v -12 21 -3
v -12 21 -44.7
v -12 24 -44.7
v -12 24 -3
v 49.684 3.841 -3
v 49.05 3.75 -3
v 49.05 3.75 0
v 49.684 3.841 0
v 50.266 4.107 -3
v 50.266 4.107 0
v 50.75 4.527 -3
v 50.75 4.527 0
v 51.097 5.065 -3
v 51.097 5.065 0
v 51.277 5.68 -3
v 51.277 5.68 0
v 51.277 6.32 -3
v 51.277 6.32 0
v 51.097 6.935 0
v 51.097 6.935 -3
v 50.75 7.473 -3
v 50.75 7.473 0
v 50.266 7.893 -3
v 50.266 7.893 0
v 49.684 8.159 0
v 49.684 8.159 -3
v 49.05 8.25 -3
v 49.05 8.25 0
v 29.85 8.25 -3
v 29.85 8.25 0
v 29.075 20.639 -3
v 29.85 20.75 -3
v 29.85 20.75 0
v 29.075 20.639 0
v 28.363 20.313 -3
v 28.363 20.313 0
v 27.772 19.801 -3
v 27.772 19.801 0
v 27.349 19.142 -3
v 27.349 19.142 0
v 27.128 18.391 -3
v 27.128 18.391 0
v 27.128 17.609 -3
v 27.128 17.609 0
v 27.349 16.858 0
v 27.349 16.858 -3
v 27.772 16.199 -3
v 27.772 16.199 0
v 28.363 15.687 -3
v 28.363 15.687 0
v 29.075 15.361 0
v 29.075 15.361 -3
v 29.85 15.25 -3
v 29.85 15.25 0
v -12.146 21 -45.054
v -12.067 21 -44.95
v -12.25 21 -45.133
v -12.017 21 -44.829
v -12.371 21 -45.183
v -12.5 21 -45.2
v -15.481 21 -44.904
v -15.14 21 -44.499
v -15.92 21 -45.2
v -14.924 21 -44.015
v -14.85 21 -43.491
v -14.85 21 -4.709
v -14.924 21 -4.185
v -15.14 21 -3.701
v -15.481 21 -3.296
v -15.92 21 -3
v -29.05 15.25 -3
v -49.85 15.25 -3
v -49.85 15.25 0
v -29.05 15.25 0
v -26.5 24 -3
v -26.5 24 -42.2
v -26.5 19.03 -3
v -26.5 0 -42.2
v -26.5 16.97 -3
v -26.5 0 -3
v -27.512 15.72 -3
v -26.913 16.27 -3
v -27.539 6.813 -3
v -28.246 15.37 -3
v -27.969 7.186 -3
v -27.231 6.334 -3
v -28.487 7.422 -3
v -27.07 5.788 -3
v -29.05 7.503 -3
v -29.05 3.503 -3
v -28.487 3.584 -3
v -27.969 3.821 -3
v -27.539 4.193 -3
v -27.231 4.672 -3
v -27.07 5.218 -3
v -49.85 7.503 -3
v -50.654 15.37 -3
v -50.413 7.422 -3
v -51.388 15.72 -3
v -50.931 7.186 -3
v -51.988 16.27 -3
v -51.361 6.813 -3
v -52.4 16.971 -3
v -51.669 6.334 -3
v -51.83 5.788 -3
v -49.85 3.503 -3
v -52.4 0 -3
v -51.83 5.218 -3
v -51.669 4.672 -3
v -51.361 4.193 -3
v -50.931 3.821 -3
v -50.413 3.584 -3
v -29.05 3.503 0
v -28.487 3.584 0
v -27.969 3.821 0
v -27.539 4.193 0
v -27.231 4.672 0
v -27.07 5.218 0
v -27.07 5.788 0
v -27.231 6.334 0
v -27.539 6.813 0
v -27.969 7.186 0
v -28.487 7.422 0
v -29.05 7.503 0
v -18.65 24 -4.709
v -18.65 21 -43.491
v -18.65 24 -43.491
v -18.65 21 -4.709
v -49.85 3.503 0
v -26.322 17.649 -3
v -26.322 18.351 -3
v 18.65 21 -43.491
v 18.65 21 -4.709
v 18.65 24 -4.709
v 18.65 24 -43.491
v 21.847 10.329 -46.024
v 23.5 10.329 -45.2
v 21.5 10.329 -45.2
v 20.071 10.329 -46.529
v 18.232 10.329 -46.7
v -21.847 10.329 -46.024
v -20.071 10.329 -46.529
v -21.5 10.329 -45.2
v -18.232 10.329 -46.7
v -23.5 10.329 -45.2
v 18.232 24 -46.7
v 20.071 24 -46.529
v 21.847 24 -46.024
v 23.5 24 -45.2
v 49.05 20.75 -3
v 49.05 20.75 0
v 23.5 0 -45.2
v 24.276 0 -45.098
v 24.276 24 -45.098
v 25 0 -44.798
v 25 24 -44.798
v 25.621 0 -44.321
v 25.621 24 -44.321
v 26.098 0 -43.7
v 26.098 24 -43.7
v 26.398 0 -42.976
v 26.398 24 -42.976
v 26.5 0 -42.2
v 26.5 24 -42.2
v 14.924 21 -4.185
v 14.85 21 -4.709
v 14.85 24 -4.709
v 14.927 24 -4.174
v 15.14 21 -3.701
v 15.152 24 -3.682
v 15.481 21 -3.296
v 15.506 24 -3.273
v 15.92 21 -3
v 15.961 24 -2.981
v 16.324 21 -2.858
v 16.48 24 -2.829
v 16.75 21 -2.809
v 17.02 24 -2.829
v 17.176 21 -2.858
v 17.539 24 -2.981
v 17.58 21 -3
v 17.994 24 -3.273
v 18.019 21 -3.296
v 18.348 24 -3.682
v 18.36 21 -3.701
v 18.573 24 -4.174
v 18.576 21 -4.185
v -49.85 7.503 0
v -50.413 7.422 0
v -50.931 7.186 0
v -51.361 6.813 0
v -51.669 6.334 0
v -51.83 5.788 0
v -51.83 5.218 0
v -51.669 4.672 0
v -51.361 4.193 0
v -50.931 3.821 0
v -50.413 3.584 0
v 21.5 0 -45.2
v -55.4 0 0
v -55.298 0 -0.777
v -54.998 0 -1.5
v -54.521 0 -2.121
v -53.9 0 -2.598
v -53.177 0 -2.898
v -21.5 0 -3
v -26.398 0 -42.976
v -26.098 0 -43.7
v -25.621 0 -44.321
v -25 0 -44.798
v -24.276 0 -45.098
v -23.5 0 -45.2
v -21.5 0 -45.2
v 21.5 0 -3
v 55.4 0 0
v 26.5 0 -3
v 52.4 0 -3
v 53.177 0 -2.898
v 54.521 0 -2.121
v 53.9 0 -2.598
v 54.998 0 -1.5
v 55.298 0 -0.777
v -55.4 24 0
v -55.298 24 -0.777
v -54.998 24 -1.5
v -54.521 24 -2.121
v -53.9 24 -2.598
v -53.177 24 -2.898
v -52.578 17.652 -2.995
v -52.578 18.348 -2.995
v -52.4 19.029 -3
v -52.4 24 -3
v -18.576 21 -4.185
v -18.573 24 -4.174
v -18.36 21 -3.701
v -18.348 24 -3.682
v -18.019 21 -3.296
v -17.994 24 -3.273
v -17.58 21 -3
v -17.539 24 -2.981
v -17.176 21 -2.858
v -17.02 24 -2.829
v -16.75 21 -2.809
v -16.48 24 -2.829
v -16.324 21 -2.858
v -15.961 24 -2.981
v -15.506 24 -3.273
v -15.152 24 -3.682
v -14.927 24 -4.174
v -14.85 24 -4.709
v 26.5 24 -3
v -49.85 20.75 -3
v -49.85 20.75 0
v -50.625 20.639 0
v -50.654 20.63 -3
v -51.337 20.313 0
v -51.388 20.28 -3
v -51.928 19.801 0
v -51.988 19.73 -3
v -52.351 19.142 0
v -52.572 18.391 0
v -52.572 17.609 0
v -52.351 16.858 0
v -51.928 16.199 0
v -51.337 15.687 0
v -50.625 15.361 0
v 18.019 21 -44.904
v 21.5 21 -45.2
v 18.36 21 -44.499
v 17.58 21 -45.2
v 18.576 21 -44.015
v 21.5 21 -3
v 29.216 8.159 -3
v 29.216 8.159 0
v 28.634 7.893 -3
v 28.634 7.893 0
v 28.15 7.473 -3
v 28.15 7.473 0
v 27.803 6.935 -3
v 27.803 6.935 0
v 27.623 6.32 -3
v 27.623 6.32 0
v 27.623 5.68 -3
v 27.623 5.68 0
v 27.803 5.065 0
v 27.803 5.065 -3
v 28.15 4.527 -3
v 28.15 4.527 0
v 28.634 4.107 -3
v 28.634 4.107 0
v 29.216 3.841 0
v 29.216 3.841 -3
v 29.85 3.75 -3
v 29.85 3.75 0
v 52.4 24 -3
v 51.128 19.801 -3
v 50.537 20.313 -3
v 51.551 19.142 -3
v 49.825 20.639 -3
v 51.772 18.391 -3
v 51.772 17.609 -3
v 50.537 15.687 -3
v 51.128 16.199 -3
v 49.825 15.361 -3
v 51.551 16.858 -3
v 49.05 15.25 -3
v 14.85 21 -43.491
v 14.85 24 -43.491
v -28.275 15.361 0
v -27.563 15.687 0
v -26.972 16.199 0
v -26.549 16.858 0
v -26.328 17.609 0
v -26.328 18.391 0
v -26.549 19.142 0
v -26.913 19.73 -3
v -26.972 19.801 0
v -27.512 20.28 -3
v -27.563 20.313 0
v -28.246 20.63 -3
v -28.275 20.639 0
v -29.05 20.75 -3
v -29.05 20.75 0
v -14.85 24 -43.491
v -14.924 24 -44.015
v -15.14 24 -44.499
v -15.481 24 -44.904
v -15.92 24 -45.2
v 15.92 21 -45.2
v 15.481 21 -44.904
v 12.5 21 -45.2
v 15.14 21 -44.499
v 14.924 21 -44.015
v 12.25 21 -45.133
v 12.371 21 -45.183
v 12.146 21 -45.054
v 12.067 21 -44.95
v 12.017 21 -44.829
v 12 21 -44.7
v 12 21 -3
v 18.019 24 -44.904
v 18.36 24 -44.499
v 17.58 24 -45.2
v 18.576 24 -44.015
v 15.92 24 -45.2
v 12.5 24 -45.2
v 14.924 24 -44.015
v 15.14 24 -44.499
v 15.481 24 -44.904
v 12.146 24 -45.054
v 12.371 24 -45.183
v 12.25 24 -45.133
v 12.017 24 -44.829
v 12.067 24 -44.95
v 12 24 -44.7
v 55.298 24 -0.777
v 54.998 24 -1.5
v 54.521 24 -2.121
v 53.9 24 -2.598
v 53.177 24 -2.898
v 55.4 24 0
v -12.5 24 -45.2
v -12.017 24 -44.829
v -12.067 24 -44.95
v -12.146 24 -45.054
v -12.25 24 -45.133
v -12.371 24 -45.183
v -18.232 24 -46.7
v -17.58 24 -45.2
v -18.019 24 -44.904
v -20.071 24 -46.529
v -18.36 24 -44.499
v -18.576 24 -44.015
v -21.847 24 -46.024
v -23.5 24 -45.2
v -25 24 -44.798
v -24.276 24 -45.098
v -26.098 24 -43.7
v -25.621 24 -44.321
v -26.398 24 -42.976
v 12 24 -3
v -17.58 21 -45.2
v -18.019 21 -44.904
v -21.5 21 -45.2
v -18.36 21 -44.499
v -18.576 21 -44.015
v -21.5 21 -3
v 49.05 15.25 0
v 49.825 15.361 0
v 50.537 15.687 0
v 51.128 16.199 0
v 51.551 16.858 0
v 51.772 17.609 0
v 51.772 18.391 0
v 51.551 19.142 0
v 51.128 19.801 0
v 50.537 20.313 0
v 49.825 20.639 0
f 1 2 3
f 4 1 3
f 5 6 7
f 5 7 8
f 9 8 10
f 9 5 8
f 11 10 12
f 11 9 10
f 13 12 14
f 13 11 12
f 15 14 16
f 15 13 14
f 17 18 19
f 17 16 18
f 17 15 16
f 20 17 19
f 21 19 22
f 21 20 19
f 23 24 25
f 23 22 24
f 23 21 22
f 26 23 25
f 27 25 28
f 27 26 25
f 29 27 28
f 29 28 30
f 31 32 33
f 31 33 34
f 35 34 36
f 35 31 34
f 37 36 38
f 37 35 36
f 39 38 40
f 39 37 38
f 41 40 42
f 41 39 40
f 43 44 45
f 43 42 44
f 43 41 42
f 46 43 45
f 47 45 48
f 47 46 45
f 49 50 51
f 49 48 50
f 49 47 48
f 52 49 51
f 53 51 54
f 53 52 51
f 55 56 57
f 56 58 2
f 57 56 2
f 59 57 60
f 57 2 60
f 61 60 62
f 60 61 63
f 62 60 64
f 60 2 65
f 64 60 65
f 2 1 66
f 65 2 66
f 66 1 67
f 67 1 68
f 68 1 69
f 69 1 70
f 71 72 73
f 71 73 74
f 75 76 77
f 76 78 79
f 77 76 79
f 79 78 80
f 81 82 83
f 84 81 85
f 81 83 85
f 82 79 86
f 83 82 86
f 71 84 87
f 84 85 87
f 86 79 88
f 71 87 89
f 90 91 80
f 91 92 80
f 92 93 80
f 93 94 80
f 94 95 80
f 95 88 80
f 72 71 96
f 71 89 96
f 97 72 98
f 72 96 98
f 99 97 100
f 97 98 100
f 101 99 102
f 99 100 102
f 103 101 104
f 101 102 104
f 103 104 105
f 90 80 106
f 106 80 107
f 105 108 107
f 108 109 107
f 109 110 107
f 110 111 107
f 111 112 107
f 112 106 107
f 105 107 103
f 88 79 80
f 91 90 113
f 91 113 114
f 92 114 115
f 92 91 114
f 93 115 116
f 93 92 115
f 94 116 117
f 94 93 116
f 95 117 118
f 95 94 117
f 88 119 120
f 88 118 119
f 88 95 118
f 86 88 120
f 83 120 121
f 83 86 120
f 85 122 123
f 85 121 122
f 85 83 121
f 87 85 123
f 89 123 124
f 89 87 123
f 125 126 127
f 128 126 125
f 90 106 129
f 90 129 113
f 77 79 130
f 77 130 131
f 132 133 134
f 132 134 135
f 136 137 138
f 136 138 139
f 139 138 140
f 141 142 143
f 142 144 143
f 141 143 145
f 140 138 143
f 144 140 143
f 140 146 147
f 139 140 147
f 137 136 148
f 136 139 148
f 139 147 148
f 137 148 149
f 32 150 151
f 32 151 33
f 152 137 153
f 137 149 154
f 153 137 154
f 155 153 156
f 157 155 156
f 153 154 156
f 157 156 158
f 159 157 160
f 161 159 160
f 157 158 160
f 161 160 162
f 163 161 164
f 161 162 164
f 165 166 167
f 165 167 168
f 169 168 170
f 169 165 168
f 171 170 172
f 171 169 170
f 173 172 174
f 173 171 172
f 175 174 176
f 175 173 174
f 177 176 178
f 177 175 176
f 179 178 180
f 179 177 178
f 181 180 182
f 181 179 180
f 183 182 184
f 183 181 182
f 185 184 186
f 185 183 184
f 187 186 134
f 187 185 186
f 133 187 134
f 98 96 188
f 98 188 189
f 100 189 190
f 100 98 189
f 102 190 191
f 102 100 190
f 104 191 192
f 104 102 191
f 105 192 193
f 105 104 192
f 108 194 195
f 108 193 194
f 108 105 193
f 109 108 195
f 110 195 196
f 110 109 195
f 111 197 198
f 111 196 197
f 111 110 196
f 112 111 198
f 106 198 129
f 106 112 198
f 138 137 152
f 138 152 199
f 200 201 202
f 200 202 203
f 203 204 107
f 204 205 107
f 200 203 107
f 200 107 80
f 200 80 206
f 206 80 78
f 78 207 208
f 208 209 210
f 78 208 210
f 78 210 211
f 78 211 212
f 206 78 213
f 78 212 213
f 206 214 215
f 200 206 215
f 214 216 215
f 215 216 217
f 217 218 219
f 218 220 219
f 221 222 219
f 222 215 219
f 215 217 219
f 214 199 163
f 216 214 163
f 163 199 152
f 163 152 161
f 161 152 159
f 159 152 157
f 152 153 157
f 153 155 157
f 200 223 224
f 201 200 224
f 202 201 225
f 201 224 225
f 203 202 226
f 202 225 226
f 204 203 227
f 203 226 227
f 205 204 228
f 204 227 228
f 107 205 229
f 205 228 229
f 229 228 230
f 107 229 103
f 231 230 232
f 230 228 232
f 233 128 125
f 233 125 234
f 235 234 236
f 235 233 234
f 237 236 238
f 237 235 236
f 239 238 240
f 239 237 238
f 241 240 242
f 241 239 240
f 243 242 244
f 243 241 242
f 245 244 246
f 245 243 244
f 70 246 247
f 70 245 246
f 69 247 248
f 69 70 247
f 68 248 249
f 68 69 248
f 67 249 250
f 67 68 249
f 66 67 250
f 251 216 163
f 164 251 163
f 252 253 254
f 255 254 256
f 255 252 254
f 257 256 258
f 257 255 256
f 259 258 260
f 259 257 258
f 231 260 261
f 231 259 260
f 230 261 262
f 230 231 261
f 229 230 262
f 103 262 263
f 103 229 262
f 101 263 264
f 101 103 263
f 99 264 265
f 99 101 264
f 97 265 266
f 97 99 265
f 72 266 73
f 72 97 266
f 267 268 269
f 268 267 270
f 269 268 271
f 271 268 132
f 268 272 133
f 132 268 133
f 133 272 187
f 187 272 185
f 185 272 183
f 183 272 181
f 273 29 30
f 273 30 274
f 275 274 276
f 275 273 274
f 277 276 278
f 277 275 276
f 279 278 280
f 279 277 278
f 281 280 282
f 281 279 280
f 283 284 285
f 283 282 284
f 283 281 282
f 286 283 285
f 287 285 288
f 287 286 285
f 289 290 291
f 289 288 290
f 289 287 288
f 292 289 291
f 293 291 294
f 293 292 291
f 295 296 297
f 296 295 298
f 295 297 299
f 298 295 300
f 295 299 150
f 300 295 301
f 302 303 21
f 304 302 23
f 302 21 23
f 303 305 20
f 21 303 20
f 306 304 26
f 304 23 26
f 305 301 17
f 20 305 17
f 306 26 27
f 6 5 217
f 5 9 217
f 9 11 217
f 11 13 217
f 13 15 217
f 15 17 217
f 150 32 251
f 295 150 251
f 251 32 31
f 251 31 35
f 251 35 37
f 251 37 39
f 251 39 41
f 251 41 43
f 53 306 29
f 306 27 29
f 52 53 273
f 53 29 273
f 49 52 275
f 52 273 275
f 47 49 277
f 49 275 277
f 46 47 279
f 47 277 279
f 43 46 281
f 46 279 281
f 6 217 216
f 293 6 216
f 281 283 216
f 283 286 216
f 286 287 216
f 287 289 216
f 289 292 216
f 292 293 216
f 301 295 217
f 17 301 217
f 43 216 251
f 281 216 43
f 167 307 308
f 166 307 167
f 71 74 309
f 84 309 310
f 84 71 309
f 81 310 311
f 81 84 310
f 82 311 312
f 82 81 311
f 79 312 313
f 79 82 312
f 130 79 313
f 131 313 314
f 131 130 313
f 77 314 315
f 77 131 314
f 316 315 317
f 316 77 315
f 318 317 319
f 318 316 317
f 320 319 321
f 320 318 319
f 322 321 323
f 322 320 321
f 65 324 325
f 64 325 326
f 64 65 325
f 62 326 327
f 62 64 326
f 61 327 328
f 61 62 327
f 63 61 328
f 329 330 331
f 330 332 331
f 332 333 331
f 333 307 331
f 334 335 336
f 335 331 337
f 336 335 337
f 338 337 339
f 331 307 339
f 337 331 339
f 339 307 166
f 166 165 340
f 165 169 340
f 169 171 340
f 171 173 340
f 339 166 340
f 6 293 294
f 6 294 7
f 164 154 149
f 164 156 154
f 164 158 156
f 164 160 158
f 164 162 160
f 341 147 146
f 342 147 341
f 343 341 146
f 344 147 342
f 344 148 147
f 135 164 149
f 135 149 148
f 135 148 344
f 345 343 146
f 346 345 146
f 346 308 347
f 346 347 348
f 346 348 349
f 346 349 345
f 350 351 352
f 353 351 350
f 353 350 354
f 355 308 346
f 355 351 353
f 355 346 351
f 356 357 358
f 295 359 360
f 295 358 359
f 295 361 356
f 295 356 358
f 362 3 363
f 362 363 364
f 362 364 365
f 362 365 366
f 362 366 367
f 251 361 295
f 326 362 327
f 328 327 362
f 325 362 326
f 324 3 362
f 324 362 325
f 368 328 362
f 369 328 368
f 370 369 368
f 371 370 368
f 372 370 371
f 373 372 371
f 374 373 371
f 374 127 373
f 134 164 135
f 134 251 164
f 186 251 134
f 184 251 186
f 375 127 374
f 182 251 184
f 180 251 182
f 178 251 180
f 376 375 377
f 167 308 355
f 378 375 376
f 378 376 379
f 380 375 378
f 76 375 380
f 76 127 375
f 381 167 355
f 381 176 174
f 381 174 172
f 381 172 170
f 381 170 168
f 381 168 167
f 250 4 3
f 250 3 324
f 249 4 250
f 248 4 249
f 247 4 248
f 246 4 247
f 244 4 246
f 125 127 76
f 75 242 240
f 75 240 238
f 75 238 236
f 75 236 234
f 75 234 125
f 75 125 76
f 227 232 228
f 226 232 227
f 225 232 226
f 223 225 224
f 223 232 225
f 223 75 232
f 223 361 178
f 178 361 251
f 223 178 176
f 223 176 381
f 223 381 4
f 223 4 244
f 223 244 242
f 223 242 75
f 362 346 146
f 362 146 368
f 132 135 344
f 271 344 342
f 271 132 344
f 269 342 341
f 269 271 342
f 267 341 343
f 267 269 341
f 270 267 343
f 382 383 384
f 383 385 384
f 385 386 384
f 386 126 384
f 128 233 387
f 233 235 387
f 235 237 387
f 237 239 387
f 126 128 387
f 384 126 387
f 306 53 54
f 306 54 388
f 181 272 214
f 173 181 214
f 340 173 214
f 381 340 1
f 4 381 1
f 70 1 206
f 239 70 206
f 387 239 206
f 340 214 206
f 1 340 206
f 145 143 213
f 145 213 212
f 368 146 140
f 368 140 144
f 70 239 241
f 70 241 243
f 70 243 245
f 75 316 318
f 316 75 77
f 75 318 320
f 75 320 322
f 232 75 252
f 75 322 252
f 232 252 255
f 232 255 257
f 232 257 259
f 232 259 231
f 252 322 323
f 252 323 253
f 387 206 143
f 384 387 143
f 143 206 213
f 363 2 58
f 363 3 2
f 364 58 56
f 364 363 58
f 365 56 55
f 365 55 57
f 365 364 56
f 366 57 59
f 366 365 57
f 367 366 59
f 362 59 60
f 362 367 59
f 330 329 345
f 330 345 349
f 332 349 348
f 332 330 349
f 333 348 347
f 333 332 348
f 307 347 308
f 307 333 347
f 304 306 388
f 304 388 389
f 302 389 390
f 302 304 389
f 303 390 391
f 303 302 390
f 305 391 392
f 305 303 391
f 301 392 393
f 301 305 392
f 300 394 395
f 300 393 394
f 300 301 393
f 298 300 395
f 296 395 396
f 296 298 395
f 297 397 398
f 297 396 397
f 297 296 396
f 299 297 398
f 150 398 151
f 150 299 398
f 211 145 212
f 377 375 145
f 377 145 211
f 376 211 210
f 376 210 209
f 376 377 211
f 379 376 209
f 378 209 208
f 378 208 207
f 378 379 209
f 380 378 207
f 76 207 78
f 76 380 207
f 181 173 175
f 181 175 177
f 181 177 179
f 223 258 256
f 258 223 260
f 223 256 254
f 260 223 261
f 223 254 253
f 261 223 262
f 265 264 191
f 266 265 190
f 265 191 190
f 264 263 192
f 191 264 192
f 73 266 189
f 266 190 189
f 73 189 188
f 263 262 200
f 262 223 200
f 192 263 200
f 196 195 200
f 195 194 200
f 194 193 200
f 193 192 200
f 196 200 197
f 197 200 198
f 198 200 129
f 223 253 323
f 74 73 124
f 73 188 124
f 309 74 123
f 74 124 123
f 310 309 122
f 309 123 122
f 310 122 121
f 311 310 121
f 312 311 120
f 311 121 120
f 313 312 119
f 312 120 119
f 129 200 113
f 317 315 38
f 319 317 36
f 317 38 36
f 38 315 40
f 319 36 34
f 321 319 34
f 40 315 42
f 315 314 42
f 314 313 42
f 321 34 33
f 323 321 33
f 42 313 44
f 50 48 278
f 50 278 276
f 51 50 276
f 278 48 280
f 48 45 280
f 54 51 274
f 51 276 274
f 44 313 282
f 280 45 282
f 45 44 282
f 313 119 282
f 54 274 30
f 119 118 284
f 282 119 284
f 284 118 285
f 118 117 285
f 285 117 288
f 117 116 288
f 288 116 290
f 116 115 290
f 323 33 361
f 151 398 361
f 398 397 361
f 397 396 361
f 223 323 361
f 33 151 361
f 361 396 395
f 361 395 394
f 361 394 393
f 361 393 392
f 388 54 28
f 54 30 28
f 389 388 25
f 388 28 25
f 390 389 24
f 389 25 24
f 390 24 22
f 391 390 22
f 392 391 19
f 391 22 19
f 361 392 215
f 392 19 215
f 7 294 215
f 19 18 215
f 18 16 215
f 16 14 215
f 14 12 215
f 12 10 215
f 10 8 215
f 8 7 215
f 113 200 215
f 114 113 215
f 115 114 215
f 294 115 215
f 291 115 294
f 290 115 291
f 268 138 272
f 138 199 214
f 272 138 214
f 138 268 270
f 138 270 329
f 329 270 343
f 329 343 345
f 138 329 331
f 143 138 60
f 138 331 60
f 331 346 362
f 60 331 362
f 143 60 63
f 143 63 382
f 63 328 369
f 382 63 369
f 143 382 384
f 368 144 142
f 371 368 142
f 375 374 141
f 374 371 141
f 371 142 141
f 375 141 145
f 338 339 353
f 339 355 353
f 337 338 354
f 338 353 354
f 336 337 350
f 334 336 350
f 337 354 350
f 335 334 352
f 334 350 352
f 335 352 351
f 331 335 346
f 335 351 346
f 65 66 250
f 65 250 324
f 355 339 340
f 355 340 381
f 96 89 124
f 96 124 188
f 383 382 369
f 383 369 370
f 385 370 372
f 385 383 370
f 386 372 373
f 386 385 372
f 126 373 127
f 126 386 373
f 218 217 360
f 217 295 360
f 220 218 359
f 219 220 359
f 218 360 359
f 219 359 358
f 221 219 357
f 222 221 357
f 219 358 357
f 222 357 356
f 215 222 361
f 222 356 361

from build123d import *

# Parameters (mm, degrees)
BOSS_EXTRUDE5_DEPTH = 24
SKETCH3_W           = 9.5
SKETCH3_H           = 3
BOSS_EXTRUDE7_DEPTH = 42.2
CUT_EXTRUDE3_DEPTH  = 42.2
CUT_EXTRUDE4_DEPTH  = 42.2
FILLET1_R           = 3
FILLET2_R           = 3
FILLET3_R           = 0.5
FILLET4_R           = 0.5
FILLET5_R           = 3
FILLET6_R           = 3
CUT_EXTRUDE5_DEPTH  = 42.2
CUT_EXTRUDE6_DEPTH  = 42.2
CUT_EXTRUDE7_DEPTH  = 42.2
SKETCH8_W           = 47
SKETCH8_H           = 13.670613598
BOSS_EXTRUDE8_DEPTH = 1.5
FILLET7_R           = 10


# Some blends are built 0.0001 mm under size
with BuildPart() as part:
    # Sketch1 → Boss-Extrude5 (new body)
    with BuildSketch(Plane(origin=(0, 0, 0), x_dir=(1, 0, 0), z_dir=(0, 1, 0))):
        Polygon((-55.4, 0), (55.4, 0), (55.4, 3), (26.5, 3), (26.5, 45.2), (21.5, 45.2), (21.5, 3), (-21.5, 3), (-21.5, 45.2), (-26.5, 45.2), (-26.5, 3), (-55.4, 3), align=None)
    extrude(amount=BOSS_EXTRUDE5_DEPTH)

    # Sketch3 → Boss-Extrude7 (add)
    with BuildSketch(Plane(origin=(0, 0, -3), x_dir=(-1, 0, 0), z_dir=(0, 0, -1))):
        with Locations((-16.75, 22.5)):
            Rectangle(SKETCH3_W, SKETCH3_H)
        with Locations((16.75, 22.5)):
            Rectangle(SKETCH3_W, SKETCH3_H)
    extrude(amount=BOSS_EXTRUDE7_DEPTH)

    # Sketch5 → Cut-Extrude3 (cut)
    with BuildSketch(Plane(origin=(0, 21, 0), x_dir=(-1, 0, 0), z_dir=(0, -1, 0))):
        with BuildLine():
            Line((-14.85, 43.490720045), (-14.85, 4.709279955))
            ThreePointArc((-14.85, 4.709279955), (-16.75, 2.809279955), (-18.65, 4.709279955))
            Line((-18.65, 4.709279955), (-18.65, 43.490720045))
            ThreePointArc((-18.65, 43.490720045), (-16.75, 45.390720045), (-14.85, 43.490720045))
        make_face()
    extrude(amount=-CUT_EXTRUDE3_DEPTH, mode=Mode.SUBTRACT)

    # Sketch5<4> → Cut-Extrude4 (cut)
    with BuildSketch(Plane(origin=(0, 21, 0), x_dir=(-1, 0, 0), z_dir=(0, -1, 0))):
        with BuildLine():
            Line((14.85, 4.709279955), (14.85, 43.490720045))
            ThreePointArc((14.85, 43.490720045), (16.75, 45.390720045), (18.65, 43.490720045))
            Line((18.65, 43.490720045), (18.65, 4.709279955))
            ThreePointArc((18.65, 4.709279955), (16.75, 2.809279955), (14.85, 4.709279955))
        make_face()
    extrude(amount=-CUT_EXTRUDE4_DEPTH, mode=Mode.SUBTRACT)

    # Fillet1
    fillet1_edges = [part.edges().sort_by_distance(p)[0] for p in [
        (-26.5, 12, -45.2),
    ]]
    fillet(fillet1_edges, radius=FILLET1_R)

    # Fillet2
    fillet2_edges = [part.edges().sort_by_distance(p)[0] for p in [
        (26.5, 12, -45.2),
    ]]
    fillet(fillet2_edges, radius=FILLET2_R)

    # Fillet3
    fillet3_edges = [part.edges().sort_by_distance(p)[0] for p in [
        (-12, 22.5, -45.2),
    ]]
    fillet(fillet3_edges, radius=FILLET3_R)

    # Fillet4
    fillet4_edges = [part.edges().sort_by_distance(p)[0] for p in [
        (12, 22.5, -45.2),
    ]]
    fillet(fillet4_edges, radius=FILLET4_R)

    # Fillet5
    fillet5_edges = [part.edges().sort_by_distance(p)[0] for p in [
        (55.4, 12, -3),
    ]]
    fillet(fillet5_edges, radius=FILLET5_R - 0.0001)  # a hair under: the kernel refuses the full size

    # Fillet6
    fillet6_edges = [part.edges().sort_by_distance(p)[0] for p in [
        (-55.4, 12, -3),
    ]]
    fillet(fillet6_edges, radius=FILLET6_R - 0.0001)  # a hair under: the kernel refuses the full size

    # Sketch6 → Cut-Extrude5 (cut)
    with BuildSketch(Plane(origin=(0, 0, -3), x_dir=(-1, 0, 0), z_dir=(0, 0, -1))):
        with BuildLine():
            Line((-29.85, 15.25), (-49.05, 15.25))
            ThreePointArc((-49.05, 15.25), (-51.8, 18), (-49.05, 20.75))
            Line((-49.05, 20.75), (-29.85, 20.75))
            ThreePointArc((-29.85, 20.75), (-27.1, 18), (-29.85, 15.25))
        make_face()
        with BuildLine():
            Line((-29.85, 3.75), (-49.05, 3.75))
            ThreePointArc((-49.05, 3.75), (-51.3, 6), (-49.05, 8.25))
            Line((-49.05, 8.25), (-29.85, 8.25))
            ThreePointArc((-29.85, 8.25), (-27.6, 6), (-29.85, 3.75))
        make_face()
    extrude(amount=-CUT_EXTRUDE5_DEPTH, mode=Mode.SUBTRACT)

    # Sketch7 → Cut-Extrude6 (cut)
    with BuildSketch(Plane(origin=(0, 0, -3), x_dir=(-1, 0, 0), z_dir=(0, 0, -1))):
        with BuildLine():
            Line((49.85, 15.25), (29.05, 15.25))
            ThreePointArc((29.05, 15.25), (26.3, 18), (29.05, 20.75))
            Line((29.05, 20.75), (49.85, 20.75))
            ThreePointArc((49.85, 20.75), (52.6, 18), (49.85, 15.25))
        make_face()
    extrude(amount=-CUT_EXTRUDE6_DEPTH, mode=Mode.SUBTRACT)

    # Sketch7<3> → Cut-Extrude7 (cut)
    with BuildSketch(Plane(origin=(0, 0, -3), x_dir=(-1, 0, 0), z_dir=(0, 0, -1))):
        with BuildLine():
            Line((29.05, 7.503040911), (49.85, 7.503040911))
            ThreePointArc((49.85, 7.503040911), (51.85, 5.503040911), (49.85, 3.503040911))
            Line((49.85, 3.503040911), (29.05, 3.503040911))
            ThreePointArc((29.05, 3.503040911), (27.05, 5.503040911), (29.05, 7.503040911))
        make_face()
    extrude(amount=-CUT_EXTRUDE7_DEPTH, mode=Mode.SUBTRACT)

    # Sketch8 → Boss-Extrude8 (add)
    with BuildSketch(Plane(origin=(0, 0, -45.2), x_dir=(-1, 0, 0), z_dir=(0, 0, -1))):
        with Locations((0, 17.164693201)):
            Rectangle(SKETCH8_W, SKETCH8_H)
    extrude(amount=BOSS_EXTRUDE8_DEPTH)

    # Fillet7
    # the kernel refuses this fillet: 10 mm, written as the material it takes off along each edge
    with BuildSketch(Plane(origin=(23.5, 37.169567191, -46.7), x_dir=(0, 0, 1), z_dir=(0, -1, 0)), Plane(origin=(-23.5, -2.840180789, -46.7), x_dir=(0, 0, 1), z_dir=(0, 1, 0))) as fillet7_piece_1:
        with BuildLine():
            CenterArc((10, 5.267826876), FILLET7_R, 180, 31.788330617)
            Line((0, 5.267826876), (-0.2, 5.267826876))
            Line((-0.2, 5.267826876), (-0.2, 0))
            Line((-0.2, 0), (0, -0.2))
            ThreePointArc((0, -0.2), (0.75, -0.2), (1.33, -0.105356538))
            Line((1.33, -0.105356538), (1.5, 0))
        make_face()
    extrude(amount=40.00974798, mode=Mode.SUBTRACT)


solid = part.part
